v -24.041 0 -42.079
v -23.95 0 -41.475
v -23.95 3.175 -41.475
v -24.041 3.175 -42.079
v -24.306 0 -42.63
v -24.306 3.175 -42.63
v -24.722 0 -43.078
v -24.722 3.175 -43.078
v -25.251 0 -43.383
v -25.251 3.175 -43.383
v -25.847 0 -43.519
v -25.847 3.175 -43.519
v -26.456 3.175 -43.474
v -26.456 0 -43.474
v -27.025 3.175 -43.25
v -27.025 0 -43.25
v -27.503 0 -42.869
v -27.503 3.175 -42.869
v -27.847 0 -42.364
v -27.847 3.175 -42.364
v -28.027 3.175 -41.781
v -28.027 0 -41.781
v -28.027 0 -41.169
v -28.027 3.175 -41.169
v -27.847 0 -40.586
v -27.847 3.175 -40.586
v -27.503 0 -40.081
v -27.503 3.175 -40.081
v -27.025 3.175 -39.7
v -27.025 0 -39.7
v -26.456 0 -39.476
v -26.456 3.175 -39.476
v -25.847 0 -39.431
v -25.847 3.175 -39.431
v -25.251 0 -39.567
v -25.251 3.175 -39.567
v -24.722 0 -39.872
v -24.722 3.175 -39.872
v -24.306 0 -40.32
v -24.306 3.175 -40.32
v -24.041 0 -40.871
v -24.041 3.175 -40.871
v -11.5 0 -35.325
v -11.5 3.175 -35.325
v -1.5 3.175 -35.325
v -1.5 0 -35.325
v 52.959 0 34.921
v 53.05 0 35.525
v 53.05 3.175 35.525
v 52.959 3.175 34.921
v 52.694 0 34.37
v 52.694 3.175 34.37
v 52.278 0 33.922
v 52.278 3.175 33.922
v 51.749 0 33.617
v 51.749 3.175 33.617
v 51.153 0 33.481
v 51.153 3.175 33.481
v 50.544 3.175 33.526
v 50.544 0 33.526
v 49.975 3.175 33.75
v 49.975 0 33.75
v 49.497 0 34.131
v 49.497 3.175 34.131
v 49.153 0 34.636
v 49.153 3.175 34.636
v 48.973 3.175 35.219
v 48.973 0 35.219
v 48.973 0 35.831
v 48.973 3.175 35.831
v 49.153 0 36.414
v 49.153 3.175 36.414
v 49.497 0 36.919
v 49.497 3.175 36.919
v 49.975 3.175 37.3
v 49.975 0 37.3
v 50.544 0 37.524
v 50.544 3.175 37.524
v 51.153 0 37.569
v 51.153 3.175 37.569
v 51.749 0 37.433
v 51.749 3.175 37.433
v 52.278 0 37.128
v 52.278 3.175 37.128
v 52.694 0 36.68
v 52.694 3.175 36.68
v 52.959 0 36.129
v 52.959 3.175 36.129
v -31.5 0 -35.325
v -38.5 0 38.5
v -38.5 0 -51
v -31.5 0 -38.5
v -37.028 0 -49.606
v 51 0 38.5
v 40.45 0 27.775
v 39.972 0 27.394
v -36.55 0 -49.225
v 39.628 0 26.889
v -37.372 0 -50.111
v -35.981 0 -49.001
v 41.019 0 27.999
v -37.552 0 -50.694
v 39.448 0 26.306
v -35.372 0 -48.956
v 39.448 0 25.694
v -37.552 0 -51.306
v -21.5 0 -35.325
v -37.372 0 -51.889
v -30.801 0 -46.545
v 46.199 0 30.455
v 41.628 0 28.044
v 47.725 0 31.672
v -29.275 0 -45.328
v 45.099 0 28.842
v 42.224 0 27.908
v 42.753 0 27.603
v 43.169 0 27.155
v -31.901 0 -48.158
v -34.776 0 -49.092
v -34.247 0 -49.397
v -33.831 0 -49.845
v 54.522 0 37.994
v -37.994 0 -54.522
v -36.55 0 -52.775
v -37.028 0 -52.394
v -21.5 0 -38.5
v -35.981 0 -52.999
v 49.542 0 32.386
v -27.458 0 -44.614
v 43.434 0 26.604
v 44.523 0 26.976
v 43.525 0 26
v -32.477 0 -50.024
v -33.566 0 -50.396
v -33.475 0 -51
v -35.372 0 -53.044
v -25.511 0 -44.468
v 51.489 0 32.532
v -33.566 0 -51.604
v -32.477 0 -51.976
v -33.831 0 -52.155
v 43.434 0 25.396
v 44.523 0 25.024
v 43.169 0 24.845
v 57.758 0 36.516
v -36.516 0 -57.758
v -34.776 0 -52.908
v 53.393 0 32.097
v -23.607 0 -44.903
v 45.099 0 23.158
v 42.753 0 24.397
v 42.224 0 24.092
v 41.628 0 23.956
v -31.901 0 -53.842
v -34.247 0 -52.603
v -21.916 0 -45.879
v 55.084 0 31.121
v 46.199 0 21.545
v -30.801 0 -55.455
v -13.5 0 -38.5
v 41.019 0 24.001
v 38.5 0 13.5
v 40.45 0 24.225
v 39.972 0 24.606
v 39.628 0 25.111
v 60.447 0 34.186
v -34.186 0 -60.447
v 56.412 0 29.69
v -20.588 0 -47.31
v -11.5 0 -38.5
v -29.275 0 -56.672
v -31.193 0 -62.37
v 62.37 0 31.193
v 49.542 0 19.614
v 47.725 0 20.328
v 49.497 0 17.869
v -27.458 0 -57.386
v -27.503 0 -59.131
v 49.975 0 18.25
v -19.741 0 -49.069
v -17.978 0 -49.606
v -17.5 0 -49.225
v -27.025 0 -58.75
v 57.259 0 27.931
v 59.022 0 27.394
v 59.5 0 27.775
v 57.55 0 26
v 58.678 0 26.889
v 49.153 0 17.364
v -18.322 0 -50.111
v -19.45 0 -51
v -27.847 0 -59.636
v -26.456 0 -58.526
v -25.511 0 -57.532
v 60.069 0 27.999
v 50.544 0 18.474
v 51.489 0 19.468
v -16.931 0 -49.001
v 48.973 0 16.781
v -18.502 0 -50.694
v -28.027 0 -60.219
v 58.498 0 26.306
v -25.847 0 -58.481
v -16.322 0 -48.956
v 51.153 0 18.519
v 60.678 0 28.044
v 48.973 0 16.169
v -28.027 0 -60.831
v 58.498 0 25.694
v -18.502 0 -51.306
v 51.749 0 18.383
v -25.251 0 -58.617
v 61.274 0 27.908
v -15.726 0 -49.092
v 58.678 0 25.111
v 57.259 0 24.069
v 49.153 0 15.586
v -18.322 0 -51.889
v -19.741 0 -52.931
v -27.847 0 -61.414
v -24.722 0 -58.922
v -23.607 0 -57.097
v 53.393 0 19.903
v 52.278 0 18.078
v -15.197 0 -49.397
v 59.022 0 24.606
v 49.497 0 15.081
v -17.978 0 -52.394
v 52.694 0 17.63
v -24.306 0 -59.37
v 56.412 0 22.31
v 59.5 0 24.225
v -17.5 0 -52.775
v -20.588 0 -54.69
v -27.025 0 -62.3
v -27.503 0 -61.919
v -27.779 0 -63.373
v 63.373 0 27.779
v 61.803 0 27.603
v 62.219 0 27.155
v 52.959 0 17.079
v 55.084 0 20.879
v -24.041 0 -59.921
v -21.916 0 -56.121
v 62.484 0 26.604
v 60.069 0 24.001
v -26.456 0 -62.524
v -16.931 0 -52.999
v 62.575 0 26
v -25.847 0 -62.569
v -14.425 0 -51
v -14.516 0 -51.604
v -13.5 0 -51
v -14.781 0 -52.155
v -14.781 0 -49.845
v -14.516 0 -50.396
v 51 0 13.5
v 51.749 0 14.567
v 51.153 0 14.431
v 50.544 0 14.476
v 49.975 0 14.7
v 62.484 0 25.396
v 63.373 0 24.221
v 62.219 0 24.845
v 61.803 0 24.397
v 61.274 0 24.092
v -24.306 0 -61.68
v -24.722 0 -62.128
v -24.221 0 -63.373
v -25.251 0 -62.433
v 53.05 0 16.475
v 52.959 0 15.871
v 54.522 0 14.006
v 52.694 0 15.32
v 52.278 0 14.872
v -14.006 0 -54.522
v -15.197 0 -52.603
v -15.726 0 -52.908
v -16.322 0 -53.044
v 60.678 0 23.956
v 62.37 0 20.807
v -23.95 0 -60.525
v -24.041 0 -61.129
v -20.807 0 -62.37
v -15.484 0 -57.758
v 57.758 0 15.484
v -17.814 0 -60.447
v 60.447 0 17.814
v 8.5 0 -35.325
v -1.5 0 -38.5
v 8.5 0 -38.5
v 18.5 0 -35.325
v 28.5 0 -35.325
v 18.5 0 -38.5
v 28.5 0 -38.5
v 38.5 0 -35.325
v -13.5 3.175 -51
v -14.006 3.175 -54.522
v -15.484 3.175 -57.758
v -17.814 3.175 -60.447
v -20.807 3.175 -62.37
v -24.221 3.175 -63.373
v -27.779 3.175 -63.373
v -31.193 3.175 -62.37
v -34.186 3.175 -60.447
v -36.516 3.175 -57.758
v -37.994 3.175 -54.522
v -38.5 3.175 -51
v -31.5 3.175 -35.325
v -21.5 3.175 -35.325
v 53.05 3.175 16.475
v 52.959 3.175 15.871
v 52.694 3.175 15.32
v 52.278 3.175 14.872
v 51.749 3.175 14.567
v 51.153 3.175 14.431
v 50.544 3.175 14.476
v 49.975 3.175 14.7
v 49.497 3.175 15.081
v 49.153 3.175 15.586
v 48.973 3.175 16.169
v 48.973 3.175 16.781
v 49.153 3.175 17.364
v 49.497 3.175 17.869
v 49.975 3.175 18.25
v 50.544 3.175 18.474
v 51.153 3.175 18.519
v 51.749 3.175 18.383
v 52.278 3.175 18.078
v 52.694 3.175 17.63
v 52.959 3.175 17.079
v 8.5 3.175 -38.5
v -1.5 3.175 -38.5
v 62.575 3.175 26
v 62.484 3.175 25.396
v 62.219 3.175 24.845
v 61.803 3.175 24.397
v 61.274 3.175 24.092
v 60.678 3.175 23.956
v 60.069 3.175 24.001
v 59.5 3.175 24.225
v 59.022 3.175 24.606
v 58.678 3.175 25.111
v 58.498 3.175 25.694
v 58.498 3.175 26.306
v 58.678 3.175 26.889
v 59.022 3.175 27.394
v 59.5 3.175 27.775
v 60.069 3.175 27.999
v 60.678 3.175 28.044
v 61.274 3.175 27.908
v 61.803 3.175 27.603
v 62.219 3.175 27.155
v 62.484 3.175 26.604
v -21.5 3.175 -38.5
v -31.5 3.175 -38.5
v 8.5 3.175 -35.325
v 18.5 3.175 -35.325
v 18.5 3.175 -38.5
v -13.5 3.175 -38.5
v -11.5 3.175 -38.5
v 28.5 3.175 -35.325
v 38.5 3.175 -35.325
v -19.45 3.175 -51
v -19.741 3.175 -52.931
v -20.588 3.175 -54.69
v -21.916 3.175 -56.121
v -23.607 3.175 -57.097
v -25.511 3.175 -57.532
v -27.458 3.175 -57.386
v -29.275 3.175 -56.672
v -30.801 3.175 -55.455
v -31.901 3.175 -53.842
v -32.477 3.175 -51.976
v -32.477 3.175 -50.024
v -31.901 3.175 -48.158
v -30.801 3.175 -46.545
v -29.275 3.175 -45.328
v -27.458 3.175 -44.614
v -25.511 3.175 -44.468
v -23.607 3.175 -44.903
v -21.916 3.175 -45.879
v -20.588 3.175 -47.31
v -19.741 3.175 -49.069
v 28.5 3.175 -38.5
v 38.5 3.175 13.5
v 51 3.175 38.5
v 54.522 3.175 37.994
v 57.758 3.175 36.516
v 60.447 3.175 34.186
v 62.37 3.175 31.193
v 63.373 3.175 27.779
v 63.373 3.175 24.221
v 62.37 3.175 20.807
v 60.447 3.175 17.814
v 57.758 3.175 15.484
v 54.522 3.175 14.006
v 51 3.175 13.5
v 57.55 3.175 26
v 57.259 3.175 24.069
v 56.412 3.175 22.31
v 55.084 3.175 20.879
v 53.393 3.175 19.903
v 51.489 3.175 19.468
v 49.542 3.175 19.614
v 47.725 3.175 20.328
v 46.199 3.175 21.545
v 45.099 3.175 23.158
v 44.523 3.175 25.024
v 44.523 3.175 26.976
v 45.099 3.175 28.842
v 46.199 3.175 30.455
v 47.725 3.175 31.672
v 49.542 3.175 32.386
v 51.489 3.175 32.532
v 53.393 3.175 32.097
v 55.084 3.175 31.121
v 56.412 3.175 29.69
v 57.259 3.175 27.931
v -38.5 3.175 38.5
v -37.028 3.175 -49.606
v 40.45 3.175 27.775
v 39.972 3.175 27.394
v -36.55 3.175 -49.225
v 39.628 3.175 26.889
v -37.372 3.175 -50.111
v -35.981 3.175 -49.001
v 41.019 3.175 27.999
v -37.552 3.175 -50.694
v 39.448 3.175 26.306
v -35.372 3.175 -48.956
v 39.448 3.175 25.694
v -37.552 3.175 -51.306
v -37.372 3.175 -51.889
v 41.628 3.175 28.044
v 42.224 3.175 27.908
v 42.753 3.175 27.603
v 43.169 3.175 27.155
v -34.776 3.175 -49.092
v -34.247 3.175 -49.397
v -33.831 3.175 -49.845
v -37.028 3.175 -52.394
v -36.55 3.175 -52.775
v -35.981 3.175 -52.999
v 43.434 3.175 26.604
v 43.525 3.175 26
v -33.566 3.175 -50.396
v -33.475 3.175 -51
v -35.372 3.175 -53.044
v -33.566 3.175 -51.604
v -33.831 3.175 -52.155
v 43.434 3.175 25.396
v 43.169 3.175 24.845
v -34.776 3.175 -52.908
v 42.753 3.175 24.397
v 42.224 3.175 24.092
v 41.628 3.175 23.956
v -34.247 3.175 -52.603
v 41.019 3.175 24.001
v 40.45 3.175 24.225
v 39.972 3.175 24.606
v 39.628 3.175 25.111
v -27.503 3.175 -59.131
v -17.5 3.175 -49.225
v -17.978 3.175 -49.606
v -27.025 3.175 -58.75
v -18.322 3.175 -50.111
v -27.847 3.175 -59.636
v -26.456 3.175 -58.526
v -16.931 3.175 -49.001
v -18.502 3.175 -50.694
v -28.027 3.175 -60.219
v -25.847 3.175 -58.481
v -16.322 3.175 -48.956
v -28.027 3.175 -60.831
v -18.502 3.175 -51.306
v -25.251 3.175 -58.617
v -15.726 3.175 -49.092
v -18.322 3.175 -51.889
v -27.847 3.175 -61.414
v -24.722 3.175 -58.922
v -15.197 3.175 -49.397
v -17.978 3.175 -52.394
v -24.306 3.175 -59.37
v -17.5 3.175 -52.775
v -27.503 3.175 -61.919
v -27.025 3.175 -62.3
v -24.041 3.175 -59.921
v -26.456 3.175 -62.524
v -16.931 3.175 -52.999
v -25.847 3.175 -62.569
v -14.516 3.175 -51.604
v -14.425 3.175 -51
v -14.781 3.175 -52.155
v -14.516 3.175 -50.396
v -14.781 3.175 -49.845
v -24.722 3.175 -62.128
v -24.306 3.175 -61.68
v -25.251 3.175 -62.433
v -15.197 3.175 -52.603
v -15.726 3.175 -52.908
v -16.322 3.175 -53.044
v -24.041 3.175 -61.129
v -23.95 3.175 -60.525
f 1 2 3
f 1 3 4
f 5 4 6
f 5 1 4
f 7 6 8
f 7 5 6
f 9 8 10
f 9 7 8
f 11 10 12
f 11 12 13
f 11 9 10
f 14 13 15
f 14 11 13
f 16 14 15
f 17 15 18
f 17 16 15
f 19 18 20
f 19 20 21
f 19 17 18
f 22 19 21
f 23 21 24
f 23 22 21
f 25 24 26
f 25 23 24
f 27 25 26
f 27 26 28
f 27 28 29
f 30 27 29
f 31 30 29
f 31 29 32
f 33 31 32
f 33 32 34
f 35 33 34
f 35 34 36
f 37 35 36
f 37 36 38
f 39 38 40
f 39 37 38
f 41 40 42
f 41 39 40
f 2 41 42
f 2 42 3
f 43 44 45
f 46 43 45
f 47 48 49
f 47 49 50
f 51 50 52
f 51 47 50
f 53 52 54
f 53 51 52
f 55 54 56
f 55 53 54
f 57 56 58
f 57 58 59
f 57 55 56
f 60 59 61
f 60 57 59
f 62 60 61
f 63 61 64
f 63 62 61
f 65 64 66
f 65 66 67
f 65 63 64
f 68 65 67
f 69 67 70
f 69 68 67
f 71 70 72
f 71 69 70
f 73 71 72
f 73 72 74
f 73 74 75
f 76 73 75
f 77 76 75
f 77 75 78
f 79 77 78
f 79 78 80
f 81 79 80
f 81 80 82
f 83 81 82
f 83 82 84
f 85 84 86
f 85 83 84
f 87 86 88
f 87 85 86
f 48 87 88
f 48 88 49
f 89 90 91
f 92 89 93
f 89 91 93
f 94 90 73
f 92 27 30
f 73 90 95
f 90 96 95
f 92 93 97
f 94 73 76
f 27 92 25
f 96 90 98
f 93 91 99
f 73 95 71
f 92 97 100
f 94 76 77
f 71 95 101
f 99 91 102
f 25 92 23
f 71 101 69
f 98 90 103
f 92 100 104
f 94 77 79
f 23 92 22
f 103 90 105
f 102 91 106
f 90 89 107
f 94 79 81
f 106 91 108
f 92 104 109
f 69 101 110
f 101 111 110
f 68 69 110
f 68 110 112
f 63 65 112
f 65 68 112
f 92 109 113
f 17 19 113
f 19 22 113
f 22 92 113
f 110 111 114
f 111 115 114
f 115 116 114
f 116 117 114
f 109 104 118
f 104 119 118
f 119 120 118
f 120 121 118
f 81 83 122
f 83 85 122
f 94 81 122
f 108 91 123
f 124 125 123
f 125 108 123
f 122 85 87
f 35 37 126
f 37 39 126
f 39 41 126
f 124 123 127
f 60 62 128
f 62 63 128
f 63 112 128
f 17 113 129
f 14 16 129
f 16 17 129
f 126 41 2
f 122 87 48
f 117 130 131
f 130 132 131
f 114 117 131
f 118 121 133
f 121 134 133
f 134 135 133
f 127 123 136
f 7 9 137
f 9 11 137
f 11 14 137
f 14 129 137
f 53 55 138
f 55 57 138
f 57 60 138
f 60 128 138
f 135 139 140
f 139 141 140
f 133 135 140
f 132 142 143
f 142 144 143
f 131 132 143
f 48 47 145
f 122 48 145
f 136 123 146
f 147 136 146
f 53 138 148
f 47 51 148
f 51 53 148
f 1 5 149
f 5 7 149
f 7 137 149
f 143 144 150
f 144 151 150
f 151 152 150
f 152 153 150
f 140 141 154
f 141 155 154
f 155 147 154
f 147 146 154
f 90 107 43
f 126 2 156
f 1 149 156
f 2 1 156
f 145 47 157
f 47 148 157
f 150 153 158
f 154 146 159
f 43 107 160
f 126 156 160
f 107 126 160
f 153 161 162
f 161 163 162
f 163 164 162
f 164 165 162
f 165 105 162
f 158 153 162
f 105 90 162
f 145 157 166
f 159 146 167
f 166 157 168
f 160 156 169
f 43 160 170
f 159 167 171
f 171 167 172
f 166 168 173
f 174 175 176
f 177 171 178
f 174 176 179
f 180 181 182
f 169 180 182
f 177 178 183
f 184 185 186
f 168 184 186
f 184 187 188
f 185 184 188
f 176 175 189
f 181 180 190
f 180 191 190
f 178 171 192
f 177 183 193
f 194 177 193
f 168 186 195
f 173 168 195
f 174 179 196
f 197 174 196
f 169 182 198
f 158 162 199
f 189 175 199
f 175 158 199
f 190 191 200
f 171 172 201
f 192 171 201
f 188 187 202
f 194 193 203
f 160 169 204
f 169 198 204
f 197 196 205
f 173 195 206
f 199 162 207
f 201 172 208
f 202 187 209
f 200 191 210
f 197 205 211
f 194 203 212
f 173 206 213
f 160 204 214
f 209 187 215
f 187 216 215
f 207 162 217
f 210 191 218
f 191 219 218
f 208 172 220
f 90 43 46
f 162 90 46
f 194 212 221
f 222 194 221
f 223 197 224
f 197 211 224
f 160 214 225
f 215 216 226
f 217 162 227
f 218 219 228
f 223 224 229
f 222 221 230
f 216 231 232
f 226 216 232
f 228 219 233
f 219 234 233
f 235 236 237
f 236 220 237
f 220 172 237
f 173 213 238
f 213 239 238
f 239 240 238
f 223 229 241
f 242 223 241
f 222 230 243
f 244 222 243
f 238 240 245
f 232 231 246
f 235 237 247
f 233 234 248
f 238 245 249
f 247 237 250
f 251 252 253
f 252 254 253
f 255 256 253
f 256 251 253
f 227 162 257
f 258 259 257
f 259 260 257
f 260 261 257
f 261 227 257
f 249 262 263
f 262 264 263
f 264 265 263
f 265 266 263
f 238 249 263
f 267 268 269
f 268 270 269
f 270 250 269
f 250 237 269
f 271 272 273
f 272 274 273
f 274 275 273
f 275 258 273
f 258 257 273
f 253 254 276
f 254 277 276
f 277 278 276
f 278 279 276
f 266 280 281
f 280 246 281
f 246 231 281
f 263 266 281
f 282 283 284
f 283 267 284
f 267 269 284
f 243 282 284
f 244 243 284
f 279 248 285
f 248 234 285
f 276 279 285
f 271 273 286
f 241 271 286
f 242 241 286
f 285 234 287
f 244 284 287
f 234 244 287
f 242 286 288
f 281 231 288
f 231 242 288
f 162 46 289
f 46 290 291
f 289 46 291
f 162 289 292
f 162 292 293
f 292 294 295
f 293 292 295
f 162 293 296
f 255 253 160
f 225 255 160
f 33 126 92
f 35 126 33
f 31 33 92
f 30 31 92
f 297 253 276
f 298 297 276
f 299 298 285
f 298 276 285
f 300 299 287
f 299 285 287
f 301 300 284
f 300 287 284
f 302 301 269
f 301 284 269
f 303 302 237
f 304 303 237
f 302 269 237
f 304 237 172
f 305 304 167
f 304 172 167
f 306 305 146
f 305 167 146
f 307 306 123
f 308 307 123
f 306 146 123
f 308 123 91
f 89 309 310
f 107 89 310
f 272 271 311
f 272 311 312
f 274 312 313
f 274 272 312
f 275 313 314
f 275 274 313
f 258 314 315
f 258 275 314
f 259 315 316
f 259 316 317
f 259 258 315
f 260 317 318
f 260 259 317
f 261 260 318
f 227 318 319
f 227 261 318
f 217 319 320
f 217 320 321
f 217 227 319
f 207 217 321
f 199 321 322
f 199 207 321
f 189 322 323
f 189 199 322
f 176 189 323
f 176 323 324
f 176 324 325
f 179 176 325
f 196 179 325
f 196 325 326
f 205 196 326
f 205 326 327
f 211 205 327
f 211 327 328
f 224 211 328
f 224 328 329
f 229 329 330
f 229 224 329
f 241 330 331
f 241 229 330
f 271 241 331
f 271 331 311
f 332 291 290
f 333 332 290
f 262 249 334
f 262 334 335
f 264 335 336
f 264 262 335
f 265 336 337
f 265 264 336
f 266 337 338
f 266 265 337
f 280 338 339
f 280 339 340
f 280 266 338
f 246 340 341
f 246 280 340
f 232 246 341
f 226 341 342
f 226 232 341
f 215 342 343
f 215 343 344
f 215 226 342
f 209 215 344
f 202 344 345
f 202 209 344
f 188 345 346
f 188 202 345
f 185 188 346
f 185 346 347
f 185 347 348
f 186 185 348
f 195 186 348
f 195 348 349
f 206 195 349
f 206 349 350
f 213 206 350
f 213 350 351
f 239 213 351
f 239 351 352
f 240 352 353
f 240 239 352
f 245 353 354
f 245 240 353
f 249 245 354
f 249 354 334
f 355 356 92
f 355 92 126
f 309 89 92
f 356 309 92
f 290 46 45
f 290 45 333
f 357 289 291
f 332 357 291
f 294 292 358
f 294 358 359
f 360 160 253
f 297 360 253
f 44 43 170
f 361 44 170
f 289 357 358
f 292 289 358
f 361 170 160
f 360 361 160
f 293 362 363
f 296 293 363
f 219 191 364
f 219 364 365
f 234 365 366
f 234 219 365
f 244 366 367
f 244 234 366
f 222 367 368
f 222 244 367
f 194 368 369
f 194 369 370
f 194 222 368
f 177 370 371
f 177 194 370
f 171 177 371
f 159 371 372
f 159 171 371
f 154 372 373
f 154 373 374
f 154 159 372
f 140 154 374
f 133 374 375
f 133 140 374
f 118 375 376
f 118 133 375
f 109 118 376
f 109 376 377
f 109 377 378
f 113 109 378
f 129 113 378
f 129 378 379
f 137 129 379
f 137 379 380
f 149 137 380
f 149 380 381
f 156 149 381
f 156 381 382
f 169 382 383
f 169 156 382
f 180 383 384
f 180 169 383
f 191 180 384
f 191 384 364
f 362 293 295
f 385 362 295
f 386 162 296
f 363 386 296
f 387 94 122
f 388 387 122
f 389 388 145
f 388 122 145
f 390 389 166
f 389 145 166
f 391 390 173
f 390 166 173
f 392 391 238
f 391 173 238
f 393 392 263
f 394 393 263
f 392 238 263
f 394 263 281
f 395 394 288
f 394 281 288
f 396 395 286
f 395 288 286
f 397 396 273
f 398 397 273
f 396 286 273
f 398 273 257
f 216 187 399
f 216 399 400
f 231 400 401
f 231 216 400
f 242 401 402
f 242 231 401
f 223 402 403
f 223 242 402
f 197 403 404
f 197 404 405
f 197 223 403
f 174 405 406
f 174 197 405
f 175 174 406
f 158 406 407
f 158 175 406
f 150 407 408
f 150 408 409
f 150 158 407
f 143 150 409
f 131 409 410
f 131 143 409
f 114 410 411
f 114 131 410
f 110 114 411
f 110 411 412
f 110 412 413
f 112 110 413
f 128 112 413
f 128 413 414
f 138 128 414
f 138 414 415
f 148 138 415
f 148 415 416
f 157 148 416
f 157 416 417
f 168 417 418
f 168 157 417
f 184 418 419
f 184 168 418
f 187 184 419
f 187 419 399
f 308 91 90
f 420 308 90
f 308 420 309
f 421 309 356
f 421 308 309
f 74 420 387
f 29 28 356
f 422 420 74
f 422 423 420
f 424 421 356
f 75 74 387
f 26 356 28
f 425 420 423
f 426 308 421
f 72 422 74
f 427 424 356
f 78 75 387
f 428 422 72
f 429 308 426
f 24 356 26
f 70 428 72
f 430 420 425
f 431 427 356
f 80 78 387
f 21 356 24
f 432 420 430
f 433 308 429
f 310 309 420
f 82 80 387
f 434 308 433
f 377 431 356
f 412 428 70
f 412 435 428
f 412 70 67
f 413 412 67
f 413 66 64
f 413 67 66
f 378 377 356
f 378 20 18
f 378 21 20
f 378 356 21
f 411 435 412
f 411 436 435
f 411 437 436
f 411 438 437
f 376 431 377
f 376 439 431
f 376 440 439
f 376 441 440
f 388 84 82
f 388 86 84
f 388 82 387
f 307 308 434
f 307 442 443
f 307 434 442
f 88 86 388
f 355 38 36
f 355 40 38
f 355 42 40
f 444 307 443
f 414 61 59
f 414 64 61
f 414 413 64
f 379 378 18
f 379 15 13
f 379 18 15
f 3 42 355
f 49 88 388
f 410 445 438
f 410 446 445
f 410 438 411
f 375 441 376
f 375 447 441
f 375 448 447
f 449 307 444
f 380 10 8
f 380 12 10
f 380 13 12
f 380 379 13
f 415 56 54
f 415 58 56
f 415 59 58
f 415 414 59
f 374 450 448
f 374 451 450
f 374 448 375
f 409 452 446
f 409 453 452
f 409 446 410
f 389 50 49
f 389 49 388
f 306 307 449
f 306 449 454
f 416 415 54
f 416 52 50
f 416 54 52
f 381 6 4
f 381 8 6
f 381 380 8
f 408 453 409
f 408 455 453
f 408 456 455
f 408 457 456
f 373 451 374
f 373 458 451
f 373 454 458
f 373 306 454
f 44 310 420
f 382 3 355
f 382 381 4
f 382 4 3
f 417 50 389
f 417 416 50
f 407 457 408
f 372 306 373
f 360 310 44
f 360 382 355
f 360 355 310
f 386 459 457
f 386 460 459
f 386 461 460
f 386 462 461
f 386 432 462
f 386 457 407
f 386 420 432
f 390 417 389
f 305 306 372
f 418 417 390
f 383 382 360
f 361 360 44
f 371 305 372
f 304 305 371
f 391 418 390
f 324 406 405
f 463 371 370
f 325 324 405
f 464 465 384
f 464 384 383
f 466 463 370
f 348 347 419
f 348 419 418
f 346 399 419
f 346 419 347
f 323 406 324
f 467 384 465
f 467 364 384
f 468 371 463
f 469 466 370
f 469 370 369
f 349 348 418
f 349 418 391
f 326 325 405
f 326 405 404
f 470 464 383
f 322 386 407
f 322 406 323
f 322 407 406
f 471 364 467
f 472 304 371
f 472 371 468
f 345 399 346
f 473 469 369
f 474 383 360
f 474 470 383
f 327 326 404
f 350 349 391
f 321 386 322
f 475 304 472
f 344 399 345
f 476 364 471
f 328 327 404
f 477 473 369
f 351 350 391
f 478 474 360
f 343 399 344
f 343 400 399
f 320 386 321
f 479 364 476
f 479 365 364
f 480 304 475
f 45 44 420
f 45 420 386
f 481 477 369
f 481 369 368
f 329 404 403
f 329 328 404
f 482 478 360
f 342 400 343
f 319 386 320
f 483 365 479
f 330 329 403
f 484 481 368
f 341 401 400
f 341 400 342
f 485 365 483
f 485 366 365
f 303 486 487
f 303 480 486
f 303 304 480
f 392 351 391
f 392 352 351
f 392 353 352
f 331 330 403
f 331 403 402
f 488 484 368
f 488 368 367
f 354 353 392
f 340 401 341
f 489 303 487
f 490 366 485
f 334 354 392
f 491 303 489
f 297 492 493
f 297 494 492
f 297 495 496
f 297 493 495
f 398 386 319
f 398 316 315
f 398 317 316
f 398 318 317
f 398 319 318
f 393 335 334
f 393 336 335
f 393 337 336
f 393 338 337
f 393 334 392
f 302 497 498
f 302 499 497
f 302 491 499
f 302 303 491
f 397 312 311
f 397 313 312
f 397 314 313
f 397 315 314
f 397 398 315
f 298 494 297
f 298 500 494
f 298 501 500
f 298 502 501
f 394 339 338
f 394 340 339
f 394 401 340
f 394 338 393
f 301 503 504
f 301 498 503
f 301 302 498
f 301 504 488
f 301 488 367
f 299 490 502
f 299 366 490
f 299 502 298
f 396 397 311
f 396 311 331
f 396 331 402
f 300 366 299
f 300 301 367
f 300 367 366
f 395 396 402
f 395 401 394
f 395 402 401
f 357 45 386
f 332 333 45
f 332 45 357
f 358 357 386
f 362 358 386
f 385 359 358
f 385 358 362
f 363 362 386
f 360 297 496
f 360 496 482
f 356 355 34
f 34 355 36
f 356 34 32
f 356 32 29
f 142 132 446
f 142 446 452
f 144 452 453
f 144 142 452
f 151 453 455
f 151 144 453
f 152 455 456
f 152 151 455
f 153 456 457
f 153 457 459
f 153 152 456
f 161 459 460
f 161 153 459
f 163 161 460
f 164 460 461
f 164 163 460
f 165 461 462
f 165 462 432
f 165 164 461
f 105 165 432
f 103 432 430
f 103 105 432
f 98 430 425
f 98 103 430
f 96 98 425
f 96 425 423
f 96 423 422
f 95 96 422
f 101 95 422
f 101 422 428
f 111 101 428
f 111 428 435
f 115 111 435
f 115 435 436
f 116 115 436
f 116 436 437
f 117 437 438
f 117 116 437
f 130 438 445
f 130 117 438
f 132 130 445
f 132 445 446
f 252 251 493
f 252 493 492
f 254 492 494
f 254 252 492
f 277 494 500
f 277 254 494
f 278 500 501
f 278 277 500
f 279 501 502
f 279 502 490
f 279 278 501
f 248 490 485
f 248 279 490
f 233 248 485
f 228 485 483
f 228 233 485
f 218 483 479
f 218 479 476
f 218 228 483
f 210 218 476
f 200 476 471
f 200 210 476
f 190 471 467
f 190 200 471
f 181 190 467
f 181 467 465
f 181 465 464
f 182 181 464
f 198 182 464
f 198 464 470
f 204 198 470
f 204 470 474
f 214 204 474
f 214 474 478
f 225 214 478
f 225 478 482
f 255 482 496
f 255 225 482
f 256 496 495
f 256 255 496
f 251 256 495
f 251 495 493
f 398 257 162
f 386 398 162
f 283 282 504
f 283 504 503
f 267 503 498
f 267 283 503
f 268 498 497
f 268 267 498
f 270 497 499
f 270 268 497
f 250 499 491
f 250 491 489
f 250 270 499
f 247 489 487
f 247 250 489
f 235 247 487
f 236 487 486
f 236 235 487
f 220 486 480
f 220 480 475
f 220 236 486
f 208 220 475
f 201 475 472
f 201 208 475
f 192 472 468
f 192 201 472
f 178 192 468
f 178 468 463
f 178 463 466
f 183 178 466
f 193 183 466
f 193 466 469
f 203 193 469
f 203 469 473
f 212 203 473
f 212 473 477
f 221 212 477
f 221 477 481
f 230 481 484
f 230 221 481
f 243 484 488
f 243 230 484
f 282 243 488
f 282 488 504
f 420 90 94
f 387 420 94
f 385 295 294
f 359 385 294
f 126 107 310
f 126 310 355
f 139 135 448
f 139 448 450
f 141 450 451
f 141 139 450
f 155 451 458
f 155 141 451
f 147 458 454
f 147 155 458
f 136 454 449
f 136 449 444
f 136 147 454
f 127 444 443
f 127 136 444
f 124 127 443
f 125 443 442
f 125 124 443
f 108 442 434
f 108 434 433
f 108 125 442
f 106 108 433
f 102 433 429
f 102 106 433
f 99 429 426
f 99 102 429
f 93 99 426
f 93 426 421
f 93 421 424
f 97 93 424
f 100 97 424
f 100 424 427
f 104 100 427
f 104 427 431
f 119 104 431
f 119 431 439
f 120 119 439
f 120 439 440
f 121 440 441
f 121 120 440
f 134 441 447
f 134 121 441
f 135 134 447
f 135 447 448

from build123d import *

# Parameters (mm, degrees)
SKETCH1_R           = 2.05
SKETCH1_R_2         = 6.55
BOSS_EXTRUDE1_DEPTH = 3.175
SKETCH2_W           = 10
SKETCH2_H           = 3.175
CUT_EXTRUDE1_DEPTH  = 3.175


with BuildPart() as part:
    # Sketch1 → Boss-Extrude1 (new body)
    with BuildSketch(Plane(origin=(0, 0, 0), x_dir=(1, 0, 0), z_dir=(0, 1, 0))):
        with BuildLine():
            ThreePointArc((-13.5, 51), (-26, 63.5), (-38.5, 51))
            Line((-38.5, 51), (-38.5, 38.5))
            Line((-38.5, 38.5), (-38.5, -38.5))
            Line((-38.5, -38.5), (38.5, -38.5))
            Line((38.5, -38.5), (51, -38.5))
            ThreePointArc((51, -38.5), (63.5, -26), (51, -13.5))
            Line((51, -13.5), (38.5, -13.5))
            Line((38.5, -13.5), (38.5, 38.5))
            Line((38.5, 38.5), (-13.5, 38.5))
            Line((-13.5, 38.5), (-13.5, 51))
        make_face()
        with Locations((41.475, -26)):
            Circle(SKETCH1_R, mode=Mode.SUBTRACT)
        with Locations((51, -35.525)):
            Circle(SKETCH1_R, mode=Mode.SUBTRACT)
        with Locations((51, -26)):
            Circle(SKETCH1_R_2, mode=Mode.SUBTRACT)
        with Locations((60.525, -26)):
            Circle(SKETCH1_R, mode=Mode.SUBTRACT)
        with Locations((-35.525, 51)):
            Circle(SKETCH1_R, mode=Mode.SUBTRACT)
        with Locations((-26, 41.475)):
            Circle(SKETCH1_R, mode=Mode.SUBTRACT)
        with Locations((-26, 51)):
            Circle(SKETCH1_R_2, mode=Mode.SUBTRACT)
        with Locations((-16.475, 51)):
            Circle(SKETCH1_R, mode=Mode.SUBTRACT)
        with Locations((-26, 60.525)):
            Circle(SKETCH1_R, mode=Mode.SUBTRACT)
        with Locations((51, -16.475)):
            Circle(SKETCH1_R, mode=Mode.SUBTRACT)
    extrude(amount=BOSS_EXTRUDE1_DEPTH)

    # Sketch2 → Cut-Extrude1 (cut)
    with BuildSketch(Plane(origin=(0, 3.175, 0), x_dir=(1, 0, 0), z_dir=(0, 1, 0))):
        with Locations((33.5, 36.9125)):
            Rectangle(SKETCH2_W, SKETCH2_H)
        with Locations((13.5, 36.9125)):
            Rectangle(SKETCH2_W, SKETCH2_H)
        with Locations((-6.5, 36.9125)):
            Rectangle(SKETCH2_W, SKETCH2_H)
        with Locations((-26.5, 36.9125)):
            Rectangle(SKETCH2_W, SKETCH2_H)
    extrude(amount=-CUT_EXTRUDE1_DEPTH, mode=Mode.SUBTRACT)


solid = part.part
